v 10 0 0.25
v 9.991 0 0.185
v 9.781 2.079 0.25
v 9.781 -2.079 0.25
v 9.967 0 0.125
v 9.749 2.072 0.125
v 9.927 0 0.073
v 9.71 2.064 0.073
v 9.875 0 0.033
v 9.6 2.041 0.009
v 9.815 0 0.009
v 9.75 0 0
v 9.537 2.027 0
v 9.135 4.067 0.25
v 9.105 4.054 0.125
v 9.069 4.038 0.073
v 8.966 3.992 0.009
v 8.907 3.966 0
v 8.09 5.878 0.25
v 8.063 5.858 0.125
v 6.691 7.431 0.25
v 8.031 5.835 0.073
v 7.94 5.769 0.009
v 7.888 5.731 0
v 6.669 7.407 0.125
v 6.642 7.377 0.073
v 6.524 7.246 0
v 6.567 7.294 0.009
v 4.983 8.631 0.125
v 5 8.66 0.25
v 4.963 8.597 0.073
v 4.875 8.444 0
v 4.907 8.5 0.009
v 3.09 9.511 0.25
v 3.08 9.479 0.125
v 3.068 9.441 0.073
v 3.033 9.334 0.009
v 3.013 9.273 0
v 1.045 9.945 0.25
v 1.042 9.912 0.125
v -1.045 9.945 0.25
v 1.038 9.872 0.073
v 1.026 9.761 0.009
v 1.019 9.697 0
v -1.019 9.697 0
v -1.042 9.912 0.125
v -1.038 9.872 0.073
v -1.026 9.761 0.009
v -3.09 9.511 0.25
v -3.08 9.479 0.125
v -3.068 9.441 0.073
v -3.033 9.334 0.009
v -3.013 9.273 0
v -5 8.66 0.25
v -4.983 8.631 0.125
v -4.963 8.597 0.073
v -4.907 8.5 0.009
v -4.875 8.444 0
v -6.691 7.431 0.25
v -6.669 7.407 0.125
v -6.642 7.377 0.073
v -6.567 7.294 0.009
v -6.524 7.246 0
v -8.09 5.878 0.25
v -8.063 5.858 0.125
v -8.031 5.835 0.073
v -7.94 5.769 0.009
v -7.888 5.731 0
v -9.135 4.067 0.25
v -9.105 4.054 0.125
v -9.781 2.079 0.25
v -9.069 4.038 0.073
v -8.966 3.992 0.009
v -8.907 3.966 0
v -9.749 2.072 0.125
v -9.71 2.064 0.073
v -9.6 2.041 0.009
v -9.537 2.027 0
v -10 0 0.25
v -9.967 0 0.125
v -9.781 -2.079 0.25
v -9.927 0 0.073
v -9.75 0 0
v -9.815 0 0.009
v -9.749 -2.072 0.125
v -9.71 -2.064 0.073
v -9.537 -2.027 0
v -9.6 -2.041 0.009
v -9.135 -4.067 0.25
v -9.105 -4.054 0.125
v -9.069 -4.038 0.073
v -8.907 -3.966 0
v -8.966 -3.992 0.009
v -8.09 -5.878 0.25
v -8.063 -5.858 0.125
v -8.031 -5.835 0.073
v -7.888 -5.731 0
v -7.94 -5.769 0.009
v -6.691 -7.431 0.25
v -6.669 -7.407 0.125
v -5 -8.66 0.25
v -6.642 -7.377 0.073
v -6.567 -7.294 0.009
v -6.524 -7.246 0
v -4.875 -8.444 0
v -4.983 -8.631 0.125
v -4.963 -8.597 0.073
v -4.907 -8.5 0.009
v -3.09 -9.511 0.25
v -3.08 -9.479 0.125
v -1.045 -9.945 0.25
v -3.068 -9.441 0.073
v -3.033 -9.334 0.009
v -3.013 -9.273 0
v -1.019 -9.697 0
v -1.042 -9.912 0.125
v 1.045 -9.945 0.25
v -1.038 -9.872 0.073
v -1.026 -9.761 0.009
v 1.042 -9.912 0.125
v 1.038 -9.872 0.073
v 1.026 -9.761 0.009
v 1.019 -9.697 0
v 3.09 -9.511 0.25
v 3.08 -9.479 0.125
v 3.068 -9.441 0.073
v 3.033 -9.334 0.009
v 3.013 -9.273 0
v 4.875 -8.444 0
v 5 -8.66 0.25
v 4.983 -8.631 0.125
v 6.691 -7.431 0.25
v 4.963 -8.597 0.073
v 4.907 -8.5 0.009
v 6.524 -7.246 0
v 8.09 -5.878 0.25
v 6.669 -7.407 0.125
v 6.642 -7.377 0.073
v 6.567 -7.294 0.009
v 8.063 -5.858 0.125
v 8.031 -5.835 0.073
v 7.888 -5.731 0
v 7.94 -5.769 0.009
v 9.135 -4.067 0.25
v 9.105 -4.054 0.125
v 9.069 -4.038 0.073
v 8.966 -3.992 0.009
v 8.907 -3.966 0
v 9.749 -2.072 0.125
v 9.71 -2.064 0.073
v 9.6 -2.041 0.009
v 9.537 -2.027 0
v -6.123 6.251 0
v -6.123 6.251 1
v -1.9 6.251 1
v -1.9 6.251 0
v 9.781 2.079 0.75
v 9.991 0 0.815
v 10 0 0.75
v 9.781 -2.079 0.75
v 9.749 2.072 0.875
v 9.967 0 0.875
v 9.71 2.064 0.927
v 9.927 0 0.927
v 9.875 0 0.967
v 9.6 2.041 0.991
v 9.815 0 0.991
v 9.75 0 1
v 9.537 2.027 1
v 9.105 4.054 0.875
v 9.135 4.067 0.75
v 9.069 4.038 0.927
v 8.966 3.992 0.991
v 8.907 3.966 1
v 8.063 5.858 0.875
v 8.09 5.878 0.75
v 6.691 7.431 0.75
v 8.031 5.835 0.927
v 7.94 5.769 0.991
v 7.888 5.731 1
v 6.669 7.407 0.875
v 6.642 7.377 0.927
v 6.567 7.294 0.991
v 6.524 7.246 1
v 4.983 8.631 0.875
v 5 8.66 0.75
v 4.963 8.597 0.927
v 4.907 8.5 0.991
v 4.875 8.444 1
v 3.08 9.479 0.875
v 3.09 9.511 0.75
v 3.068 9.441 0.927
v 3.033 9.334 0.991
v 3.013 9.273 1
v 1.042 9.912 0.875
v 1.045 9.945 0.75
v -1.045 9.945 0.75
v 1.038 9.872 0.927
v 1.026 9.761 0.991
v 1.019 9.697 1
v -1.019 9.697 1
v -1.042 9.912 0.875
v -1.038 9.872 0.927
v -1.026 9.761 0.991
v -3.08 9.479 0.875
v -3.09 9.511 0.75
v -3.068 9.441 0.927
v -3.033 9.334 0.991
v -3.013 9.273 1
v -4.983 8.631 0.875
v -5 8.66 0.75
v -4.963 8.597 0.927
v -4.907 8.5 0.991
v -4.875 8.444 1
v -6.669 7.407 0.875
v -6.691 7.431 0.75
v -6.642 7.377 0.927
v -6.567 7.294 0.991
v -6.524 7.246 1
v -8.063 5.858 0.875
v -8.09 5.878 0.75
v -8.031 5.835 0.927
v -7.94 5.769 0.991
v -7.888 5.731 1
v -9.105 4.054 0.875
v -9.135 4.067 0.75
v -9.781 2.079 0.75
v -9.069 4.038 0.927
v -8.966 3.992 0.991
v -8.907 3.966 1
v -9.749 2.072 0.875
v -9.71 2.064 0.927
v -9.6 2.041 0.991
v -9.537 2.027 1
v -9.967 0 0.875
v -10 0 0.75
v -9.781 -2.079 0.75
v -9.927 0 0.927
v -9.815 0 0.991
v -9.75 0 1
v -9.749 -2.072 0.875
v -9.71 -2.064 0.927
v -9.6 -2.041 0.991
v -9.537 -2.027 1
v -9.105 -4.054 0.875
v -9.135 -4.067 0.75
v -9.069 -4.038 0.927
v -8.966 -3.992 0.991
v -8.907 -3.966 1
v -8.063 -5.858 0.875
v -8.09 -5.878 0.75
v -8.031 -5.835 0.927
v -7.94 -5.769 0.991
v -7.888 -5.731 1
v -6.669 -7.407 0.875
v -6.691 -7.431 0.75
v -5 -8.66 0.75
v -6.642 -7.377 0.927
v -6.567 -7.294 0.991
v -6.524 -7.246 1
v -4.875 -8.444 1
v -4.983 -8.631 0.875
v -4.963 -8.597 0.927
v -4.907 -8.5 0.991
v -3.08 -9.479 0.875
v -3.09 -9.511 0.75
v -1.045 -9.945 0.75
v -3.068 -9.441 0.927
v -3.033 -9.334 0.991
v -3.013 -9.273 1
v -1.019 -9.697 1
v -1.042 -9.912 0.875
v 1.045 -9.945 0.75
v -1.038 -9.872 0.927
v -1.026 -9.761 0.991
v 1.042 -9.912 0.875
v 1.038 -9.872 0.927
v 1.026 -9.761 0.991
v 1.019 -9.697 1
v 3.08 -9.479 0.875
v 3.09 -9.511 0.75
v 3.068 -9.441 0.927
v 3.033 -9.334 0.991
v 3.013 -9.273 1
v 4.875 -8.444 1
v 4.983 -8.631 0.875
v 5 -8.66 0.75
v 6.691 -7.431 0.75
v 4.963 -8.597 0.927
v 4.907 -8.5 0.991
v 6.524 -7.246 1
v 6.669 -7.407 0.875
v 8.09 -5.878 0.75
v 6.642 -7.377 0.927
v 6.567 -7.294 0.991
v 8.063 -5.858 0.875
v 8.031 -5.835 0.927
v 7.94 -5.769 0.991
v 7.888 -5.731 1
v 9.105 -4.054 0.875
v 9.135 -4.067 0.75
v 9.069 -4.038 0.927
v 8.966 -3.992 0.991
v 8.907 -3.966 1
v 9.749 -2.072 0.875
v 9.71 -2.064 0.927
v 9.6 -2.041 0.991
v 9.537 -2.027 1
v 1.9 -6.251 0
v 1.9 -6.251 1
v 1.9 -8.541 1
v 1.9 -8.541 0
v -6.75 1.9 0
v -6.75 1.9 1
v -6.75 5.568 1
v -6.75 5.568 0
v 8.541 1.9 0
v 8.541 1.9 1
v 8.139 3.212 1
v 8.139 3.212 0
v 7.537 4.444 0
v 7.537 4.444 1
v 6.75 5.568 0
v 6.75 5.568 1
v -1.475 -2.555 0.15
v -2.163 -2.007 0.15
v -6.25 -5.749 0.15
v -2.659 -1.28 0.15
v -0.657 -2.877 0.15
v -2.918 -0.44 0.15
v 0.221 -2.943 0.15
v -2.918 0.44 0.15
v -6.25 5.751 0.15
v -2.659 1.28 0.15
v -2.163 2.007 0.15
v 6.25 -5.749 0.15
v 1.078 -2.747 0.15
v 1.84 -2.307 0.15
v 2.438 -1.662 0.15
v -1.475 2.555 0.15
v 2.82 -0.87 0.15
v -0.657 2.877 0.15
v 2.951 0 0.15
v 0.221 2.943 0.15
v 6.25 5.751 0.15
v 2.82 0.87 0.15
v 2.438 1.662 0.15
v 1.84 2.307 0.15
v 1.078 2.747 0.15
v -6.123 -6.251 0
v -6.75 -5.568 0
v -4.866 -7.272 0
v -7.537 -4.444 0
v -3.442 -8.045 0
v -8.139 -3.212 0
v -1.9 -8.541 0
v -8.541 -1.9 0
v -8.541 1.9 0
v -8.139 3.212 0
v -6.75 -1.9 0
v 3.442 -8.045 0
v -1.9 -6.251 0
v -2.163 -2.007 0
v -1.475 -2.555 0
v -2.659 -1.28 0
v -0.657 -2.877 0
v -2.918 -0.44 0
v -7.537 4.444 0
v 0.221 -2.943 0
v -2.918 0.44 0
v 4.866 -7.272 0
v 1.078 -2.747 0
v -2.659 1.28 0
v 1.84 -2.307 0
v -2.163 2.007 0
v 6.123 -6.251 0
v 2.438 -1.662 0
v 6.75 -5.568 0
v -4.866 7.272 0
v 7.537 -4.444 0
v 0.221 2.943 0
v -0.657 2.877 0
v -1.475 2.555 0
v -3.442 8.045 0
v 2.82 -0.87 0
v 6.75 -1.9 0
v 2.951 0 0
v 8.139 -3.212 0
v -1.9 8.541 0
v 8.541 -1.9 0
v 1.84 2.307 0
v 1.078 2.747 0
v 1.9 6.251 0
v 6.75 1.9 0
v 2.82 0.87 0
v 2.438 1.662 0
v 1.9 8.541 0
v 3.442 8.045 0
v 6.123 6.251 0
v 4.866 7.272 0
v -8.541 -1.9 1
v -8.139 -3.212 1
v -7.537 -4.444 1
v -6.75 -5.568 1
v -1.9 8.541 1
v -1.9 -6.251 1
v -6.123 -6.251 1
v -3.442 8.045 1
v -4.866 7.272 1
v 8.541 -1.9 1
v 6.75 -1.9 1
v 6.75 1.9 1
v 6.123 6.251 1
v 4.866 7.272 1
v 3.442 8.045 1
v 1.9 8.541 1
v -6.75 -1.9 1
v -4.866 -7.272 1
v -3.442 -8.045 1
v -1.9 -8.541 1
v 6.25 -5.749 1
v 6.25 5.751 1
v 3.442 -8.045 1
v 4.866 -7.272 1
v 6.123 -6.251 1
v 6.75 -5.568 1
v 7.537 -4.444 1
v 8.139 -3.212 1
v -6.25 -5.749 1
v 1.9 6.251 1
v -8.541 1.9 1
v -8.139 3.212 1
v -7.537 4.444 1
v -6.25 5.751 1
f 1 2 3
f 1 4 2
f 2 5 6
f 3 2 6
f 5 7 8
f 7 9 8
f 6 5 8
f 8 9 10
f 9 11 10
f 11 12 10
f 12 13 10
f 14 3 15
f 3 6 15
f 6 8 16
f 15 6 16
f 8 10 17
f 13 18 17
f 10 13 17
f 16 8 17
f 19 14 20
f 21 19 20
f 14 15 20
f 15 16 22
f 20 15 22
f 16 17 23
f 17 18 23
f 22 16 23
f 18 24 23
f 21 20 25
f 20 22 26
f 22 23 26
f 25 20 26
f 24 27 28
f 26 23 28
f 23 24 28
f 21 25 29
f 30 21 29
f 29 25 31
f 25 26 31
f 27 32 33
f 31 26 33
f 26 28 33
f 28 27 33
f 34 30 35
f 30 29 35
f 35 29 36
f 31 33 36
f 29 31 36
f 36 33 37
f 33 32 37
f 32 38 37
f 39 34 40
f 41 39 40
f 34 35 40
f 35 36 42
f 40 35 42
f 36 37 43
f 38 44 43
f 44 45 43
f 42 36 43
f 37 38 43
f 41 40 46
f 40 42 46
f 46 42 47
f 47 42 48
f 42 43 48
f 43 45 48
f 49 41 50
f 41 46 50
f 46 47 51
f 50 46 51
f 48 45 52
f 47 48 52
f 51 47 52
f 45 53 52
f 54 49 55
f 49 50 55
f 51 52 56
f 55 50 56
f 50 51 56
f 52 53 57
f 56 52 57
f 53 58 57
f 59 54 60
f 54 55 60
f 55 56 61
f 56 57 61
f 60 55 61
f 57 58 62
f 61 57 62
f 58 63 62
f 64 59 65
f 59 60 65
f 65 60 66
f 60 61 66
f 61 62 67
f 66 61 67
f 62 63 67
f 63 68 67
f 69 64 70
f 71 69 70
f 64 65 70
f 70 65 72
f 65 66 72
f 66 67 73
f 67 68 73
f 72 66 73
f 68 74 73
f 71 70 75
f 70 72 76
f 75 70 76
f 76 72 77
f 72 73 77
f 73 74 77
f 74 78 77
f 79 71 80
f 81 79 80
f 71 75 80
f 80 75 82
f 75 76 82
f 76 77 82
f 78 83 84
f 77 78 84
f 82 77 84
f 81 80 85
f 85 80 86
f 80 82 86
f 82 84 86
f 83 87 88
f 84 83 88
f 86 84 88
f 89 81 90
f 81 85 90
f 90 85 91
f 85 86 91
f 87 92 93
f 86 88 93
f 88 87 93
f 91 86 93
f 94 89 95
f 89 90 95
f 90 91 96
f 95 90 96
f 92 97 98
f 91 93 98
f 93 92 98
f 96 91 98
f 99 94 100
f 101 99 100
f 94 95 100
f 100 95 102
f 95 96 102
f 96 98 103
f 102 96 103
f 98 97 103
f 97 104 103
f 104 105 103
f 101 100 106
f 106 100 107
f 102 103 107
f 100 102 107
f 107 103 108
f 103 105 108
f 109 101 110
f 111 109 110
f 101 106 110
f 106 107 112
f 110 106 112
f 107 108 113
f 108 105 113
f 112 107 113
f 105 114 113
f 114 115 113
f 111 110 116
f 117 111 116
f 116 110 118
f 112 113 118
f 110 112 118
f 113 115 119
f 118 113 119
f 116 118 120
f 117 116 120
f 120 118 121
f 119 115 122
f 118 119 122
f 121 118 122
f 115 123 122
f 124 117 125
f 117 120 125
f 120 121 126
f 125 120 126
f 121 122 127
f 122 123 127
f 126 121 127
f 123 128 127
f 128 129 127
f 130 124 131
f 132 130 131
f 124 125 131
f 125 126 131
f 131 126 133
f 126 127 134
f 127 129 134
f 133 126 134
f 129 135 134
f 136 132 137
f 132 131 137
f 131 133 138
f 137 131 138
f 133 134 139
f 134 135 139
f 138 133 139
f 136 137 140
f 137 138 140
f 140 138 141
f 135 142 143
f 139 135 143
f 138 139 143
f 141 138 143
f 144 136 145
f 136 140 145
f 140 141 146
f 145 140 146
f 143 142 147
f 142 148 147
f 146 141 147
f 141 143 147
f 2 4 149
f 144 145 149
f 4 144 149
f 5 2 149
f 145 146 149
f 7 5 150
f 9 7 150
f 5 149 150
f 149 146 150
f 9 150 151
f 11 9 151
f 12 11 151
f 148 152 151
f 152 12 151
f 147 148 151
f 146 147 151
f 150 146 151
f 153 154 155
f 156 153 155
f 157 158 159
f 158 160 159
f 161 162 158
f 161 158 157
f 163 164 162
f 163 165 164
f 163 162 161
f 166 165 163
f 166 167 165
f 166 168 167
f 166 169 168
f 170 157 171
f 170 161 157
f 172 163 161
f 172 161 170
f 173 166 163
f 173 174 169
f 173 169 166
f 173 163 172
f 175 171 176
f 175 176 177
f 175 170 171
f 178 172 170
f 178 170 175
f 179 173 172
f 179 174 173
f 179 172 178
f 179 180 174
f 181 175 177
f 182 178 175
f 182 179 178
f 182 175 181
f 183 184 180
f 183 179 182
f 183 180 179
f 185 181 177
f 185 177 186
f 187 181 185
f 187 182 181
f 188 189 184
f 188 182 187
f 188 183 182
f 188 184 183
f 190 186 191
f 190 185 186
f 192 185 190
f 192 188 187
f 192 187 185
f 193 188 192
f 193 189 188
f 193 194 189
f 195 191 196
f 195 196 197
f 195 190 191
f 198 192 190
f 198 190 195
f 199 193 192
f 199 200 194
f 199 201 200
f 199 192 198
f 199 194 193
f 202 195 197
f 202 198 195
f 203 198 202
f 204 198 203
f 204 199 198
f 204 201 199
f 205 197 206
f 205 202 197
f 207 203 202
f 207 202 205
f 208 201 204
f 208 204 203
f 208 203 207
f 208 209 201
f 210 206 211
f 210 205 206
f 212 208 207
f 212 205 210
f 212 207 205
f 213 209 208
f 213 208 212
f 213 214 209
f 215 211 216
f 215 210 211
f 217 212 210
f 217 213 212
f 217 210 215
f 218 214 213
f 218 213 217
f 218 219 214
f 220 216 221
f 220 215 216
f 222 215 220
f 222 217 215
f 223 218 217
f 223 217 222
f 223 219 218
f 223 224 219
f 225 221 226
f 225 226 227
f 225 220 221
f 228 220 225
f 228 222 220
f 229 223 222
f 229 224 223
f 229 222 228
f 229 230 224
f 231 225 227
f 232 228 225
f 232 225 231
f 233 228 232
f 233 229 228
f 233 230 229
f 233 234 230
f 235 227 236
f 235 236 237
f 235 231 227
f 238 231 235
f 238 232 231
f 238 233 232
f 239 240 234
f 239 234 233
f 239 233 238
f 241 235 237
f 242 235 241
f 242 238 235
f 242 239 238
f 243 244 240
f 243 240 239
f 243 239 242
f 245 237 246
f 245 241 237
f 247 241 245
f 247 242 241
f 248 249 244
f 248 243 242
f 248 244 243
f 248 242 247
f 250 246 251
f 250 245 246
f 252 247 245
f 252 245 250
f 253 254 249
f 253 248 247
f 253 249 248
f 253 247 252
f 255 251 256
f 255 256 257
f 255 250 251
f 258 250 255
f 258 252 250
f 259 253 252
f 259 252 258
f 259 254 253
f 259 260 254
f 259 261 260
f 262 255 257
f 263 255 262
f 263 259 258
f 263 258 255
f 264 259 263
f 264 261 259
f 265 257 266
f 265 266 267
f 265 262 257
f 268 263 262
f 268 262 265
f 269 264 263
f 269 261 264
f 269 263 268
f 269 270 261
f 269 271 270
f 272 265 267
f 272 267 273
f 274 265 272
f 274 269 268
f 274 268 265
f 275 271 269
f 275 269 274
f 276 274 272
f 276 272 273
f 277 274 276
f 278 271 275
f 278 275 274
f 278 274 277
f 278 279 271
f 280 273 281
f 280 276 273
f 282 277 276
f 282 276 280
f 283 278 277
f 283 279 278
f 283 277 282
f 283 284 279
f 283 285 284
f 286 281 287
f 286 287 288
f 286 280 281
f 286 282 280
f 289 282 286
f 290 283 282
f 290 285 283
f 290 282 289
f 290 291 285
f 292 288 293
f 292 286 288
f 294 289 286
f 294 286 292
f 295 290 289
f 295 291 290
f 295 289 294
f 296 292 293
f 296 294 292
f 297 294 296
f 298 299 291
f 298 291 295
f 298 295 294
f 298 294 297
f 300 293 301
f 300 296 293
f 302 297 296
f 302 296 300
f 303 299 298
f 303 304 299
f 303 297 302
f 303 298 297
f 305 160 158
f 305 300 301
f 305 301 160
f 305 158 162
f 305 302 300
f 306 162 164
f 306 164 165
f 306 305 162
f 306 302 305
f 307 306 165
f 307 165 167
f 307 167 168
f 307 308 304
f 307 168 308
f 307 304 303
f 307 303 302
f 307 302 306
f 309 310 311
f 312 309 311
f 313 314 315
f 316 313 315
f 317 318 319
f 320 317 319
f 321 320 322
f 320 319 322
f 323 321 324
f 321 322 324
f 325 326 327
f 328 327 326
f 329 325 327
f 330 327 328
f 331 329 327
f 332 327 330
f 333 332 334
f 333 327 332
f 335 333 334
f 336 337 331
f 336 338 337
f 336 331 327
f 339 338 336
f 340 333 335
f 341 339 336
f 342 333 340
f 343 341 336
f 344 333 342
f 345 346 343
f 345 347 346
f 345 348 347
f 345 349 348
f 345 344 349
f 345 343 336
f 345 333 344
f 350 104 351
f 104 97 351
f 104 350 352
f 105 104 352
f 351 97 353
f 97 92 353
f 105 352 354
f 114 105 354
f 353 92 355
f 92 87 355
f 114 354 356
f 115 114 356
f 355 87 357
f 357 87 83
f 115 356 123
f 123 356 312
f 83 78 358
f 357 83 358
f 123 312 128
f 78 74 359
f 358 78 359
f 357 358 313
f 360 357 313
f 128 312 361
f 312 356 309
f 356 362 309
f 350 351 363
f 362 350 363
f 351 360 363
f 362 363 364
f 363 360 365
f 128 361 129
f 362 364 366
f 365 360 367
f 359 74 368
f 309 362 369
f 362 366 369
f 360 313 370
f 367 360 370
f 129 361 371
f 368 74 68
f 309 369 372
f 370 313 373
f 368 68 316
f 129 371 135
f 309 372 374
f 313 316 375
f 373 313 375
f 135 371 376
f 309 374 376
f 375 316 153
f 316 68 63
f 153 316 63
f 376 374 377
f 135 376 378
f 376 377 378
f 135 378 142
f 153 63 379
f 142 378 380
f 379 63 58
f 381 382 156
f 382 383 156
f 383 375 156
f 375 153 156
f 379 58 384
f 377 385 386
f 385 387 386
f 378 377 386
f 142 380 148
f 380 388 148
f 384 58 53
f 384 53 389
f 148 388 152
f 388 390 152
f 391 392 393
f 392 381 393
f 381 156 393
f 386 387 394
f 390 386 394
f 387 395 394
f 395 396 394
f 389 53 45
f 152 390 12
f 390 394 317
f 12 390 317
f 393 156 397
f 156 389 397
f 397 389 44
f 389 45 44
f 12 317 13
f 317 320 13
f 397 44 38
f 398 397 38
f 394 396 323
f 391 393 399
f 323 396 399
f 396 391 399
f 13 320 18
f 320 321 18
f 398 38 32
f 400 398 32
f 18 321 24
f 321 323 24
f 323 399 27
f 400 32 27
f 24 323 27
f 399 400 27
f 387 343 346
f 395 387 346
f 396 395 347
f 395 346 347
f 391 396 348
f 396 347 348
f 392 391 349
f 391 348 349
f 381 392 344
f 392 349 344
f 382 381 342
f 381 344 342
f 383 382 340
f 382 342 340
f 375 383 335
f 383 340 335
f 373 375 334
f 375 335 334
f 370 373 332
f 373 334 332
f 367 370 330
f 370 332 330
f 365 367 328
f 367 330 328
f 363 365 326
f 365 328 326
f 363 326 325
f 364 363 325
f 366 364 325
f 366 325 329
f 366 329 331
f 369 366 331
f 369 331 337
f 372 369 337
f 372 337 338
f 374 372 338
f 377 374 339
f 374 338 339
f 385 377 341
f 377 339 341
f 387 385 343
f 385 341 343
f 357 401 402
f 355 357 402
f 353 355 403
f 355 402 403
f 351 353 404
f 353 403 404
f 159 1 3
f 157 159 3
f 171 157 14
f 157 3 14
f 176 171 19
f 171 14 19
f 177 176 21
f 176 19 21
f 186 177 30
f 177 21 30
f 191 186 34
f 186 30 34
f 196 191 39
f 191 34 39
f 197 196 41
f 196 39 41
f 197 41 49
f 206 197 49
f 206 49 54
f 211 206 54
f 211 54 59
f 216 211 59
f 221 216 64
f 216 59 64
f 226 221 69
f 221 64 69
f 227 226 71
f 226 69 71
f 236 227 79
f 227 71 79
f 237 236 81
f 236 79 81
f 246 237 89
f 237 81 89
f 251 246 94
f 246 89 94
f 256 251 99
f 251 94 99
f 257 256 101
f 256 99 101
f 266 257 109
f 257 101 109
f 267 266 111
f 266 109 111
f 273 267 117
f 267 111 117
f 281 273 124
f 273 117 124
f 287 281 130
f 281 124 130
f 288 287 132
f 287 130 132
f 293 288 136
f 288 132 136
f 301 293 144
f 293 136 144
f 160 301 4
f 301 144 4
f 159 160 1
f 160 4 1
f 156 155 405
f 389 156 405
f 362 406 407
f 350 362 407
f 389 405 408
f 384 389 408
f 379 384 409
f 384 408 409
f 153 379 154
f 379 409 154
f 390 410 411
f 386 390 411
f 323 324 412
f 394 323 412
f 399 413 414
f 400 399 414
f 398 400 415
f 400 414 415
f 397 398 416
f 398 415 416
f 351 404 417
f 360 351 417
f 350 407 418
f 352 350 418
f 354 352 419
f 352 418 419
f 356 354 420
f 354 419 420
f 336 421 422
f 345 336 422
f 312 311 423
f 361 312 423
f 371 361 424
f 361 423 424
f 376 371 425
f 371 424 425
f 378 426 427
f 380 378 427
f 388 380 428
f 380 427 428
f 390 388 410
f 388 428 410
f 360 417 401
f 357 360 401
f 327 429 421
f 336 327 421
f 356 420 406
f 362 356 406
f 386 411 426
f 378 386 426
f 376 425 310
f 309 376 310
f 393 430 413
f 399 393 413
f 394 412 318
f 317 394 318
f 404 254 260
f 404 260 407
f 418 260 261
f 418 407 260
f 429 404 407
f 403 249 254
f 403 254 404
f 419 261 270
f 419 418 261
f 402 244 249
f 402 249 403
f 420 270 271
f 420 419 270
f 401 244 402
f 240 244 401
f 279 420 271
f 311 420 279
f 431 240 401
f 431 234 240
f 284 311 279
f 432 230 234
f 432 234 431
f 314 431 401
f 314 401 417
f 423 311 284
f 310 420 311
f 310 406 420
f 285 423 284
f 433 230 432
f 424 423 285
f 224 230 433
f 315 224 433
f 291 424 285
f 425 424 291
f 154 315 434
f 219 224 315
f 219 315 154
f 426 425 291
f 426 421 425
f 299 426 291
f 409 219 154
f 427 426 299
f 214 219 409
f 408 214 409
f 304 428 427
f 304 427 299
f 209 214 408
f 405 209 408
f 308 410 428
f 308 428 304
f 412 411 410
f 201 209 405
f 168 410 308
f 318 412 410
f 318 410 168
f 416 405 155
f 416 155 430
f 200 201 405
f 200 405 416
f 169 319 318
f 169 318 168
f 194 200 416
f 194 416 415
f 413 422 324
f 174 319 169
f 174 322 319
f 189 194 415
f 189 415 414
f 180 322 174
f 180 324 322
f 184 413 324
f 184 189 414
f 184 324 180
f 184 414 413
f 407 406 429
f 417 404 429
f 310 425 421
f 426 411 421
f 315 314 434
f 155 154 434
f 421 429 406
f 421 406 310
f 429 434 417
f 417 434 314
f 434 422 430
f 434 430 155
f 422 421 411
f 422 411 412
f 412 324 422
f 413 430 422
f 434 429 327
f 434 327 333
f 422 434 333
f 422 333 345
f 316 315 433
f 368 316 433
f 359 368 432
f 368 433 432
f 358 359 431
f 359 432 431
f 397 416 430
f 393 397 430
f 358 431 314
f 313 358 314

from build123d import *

# Parameters (mm, degrees)
F0_R     = 10
F1_DEPTH = 1
F2_W     = 12.5
F2_H     = 11.5
F3_DEPTH = 0.85
F5_R     = 2.9508175635
F6_DEPTH = 0.15
F7_R     = 0.25
F9_DEPTH = 1


# Not quite as in the source:
# - a feature names something its author has since deleted; it is built from what else it names


with BuildPart() as f1:
    # F0 (on Top) → F1 (new body)
    with BuildSketch(Plane.XY):
        Circle(F0_R)
    extrude(amount=F1_DEPTH)

    # F2 (on face) → F3 (cut)
    with BuildSketch(Plane.XY.offset(1)):
        with Locations((0, 0.0005259759)):
            Rectangle(F2_W, F2_H)
    extrude(amount=-F3_DEPTH, mode=Mode.SUBTRACT)

    # F5 (on offset) → F6 (cut)
    with BuildSketch(Plane.XY.offset(0.15)):
        Circle(F5_R)
    extrude(amount=-F6_DEPTH, mode=Mode.SUBTRACT)

    # F7
    f7_edges = [f1.edges().sort_by_distance(p)[0] for p in [
        (-10, 0, 1),
        (-10, 0, 0),
    ]]
    fillet(f7_edges, radius=F7_R)

    # F8 (on face) → F9 (cut, through all)
    with BuildSketch(Plane.XY.offset(1)):
        with BuildLine():
            Line((1.9, 8.5412235657), (1.9, 6.2505259759))
            Line((1.9, 6.2505259759), (6.1231874889, 6.2505259759))
            ThreePointArc((6.1231874889, 6.2505259759), (4.1718950409, 7.6914102587), (1.9, 8.5412235657))
        make_face()
        with BuildLine():
            Line((-6.75, 1.9), (-6.75, 5.5677643628))
            ThreePointArc((-6.75, 5.5677643628), (-7.8624743809, 3.8397912196), (-8.5412235657, 1.9))
            Line((-8.5412235657, 1.9), (-6.75, 1.9))
        make_face()
        with BuildLine():
            Line((-6.75, -5.5677643628), (-6.75, -1.9))
            Line((-6.75, -1.9), (-8.5412235657, -1.9))
            ThreePointArc((-8.5412235657, -1.9), (-7.8624743809, -3.8397912196), (-6.75, -5.5677643628))
        make_face()
        with BuildLine():
            Line((-1.9, -6.2505259759), (-6.1231874889, -6.2505259759))
            ThreePointArc((-6.1231874889, -6.2505259759), (-4.1718950409, -7.6914102587), (-1.9, -8.5412235657))
            Line((-1.9, -8.5412235657), (-1.9, -6.2505259759))
        make_face()
        with BuildLine():
            ThreePointArc((1.9, -8.5412235657), (4.1718950409, -7.6914102587), (6.1231874889, -6.2505259759))
            Line((6.1231874889, -6.2505259759), (1.9, -6.2505259759))
            Line((1.9, -6.2505259759), (1.9, -8.5412235657))
        make_face()
        with BuildLine():
            Line((8.5412235657, -1.9), (6.75, -1.9))
            Line((6.75, -1.9), (6.75, -5.5677643628))
            ThreePointArc((6.75, -5.5677643628), (7.8624743809, -3.8397912196), (8.5412235657, -1.9))
        make_face()
        with BuildLine():
            ThreePointArc((8.5412235657, 1.9), (7.8624743809, 3.8397912196), (6.75, 5.5677643628))
            Line((6.75, 5.5677643628), (6.75, 1.9))
            Line((6.75, 1.9), (8.5412235657, 1.9))
        make_face()
        with BuildLine():
            Line((-6.1231874889, 6.2505259759), (-1.9, 6.2505259759))
            Line((-1.9, 6.2505259759), (-1.9, 8.5412235657))
            ThreePointArc((-1.9, 8.5412235657), (-4.1718950409, 7.6914102587), (-6.1231874889, 6.2505259759))
        make_face()
    extrude(amount=-F9_DEPTH, mode=Mode.SUBTRACT)


solid = f1.part
